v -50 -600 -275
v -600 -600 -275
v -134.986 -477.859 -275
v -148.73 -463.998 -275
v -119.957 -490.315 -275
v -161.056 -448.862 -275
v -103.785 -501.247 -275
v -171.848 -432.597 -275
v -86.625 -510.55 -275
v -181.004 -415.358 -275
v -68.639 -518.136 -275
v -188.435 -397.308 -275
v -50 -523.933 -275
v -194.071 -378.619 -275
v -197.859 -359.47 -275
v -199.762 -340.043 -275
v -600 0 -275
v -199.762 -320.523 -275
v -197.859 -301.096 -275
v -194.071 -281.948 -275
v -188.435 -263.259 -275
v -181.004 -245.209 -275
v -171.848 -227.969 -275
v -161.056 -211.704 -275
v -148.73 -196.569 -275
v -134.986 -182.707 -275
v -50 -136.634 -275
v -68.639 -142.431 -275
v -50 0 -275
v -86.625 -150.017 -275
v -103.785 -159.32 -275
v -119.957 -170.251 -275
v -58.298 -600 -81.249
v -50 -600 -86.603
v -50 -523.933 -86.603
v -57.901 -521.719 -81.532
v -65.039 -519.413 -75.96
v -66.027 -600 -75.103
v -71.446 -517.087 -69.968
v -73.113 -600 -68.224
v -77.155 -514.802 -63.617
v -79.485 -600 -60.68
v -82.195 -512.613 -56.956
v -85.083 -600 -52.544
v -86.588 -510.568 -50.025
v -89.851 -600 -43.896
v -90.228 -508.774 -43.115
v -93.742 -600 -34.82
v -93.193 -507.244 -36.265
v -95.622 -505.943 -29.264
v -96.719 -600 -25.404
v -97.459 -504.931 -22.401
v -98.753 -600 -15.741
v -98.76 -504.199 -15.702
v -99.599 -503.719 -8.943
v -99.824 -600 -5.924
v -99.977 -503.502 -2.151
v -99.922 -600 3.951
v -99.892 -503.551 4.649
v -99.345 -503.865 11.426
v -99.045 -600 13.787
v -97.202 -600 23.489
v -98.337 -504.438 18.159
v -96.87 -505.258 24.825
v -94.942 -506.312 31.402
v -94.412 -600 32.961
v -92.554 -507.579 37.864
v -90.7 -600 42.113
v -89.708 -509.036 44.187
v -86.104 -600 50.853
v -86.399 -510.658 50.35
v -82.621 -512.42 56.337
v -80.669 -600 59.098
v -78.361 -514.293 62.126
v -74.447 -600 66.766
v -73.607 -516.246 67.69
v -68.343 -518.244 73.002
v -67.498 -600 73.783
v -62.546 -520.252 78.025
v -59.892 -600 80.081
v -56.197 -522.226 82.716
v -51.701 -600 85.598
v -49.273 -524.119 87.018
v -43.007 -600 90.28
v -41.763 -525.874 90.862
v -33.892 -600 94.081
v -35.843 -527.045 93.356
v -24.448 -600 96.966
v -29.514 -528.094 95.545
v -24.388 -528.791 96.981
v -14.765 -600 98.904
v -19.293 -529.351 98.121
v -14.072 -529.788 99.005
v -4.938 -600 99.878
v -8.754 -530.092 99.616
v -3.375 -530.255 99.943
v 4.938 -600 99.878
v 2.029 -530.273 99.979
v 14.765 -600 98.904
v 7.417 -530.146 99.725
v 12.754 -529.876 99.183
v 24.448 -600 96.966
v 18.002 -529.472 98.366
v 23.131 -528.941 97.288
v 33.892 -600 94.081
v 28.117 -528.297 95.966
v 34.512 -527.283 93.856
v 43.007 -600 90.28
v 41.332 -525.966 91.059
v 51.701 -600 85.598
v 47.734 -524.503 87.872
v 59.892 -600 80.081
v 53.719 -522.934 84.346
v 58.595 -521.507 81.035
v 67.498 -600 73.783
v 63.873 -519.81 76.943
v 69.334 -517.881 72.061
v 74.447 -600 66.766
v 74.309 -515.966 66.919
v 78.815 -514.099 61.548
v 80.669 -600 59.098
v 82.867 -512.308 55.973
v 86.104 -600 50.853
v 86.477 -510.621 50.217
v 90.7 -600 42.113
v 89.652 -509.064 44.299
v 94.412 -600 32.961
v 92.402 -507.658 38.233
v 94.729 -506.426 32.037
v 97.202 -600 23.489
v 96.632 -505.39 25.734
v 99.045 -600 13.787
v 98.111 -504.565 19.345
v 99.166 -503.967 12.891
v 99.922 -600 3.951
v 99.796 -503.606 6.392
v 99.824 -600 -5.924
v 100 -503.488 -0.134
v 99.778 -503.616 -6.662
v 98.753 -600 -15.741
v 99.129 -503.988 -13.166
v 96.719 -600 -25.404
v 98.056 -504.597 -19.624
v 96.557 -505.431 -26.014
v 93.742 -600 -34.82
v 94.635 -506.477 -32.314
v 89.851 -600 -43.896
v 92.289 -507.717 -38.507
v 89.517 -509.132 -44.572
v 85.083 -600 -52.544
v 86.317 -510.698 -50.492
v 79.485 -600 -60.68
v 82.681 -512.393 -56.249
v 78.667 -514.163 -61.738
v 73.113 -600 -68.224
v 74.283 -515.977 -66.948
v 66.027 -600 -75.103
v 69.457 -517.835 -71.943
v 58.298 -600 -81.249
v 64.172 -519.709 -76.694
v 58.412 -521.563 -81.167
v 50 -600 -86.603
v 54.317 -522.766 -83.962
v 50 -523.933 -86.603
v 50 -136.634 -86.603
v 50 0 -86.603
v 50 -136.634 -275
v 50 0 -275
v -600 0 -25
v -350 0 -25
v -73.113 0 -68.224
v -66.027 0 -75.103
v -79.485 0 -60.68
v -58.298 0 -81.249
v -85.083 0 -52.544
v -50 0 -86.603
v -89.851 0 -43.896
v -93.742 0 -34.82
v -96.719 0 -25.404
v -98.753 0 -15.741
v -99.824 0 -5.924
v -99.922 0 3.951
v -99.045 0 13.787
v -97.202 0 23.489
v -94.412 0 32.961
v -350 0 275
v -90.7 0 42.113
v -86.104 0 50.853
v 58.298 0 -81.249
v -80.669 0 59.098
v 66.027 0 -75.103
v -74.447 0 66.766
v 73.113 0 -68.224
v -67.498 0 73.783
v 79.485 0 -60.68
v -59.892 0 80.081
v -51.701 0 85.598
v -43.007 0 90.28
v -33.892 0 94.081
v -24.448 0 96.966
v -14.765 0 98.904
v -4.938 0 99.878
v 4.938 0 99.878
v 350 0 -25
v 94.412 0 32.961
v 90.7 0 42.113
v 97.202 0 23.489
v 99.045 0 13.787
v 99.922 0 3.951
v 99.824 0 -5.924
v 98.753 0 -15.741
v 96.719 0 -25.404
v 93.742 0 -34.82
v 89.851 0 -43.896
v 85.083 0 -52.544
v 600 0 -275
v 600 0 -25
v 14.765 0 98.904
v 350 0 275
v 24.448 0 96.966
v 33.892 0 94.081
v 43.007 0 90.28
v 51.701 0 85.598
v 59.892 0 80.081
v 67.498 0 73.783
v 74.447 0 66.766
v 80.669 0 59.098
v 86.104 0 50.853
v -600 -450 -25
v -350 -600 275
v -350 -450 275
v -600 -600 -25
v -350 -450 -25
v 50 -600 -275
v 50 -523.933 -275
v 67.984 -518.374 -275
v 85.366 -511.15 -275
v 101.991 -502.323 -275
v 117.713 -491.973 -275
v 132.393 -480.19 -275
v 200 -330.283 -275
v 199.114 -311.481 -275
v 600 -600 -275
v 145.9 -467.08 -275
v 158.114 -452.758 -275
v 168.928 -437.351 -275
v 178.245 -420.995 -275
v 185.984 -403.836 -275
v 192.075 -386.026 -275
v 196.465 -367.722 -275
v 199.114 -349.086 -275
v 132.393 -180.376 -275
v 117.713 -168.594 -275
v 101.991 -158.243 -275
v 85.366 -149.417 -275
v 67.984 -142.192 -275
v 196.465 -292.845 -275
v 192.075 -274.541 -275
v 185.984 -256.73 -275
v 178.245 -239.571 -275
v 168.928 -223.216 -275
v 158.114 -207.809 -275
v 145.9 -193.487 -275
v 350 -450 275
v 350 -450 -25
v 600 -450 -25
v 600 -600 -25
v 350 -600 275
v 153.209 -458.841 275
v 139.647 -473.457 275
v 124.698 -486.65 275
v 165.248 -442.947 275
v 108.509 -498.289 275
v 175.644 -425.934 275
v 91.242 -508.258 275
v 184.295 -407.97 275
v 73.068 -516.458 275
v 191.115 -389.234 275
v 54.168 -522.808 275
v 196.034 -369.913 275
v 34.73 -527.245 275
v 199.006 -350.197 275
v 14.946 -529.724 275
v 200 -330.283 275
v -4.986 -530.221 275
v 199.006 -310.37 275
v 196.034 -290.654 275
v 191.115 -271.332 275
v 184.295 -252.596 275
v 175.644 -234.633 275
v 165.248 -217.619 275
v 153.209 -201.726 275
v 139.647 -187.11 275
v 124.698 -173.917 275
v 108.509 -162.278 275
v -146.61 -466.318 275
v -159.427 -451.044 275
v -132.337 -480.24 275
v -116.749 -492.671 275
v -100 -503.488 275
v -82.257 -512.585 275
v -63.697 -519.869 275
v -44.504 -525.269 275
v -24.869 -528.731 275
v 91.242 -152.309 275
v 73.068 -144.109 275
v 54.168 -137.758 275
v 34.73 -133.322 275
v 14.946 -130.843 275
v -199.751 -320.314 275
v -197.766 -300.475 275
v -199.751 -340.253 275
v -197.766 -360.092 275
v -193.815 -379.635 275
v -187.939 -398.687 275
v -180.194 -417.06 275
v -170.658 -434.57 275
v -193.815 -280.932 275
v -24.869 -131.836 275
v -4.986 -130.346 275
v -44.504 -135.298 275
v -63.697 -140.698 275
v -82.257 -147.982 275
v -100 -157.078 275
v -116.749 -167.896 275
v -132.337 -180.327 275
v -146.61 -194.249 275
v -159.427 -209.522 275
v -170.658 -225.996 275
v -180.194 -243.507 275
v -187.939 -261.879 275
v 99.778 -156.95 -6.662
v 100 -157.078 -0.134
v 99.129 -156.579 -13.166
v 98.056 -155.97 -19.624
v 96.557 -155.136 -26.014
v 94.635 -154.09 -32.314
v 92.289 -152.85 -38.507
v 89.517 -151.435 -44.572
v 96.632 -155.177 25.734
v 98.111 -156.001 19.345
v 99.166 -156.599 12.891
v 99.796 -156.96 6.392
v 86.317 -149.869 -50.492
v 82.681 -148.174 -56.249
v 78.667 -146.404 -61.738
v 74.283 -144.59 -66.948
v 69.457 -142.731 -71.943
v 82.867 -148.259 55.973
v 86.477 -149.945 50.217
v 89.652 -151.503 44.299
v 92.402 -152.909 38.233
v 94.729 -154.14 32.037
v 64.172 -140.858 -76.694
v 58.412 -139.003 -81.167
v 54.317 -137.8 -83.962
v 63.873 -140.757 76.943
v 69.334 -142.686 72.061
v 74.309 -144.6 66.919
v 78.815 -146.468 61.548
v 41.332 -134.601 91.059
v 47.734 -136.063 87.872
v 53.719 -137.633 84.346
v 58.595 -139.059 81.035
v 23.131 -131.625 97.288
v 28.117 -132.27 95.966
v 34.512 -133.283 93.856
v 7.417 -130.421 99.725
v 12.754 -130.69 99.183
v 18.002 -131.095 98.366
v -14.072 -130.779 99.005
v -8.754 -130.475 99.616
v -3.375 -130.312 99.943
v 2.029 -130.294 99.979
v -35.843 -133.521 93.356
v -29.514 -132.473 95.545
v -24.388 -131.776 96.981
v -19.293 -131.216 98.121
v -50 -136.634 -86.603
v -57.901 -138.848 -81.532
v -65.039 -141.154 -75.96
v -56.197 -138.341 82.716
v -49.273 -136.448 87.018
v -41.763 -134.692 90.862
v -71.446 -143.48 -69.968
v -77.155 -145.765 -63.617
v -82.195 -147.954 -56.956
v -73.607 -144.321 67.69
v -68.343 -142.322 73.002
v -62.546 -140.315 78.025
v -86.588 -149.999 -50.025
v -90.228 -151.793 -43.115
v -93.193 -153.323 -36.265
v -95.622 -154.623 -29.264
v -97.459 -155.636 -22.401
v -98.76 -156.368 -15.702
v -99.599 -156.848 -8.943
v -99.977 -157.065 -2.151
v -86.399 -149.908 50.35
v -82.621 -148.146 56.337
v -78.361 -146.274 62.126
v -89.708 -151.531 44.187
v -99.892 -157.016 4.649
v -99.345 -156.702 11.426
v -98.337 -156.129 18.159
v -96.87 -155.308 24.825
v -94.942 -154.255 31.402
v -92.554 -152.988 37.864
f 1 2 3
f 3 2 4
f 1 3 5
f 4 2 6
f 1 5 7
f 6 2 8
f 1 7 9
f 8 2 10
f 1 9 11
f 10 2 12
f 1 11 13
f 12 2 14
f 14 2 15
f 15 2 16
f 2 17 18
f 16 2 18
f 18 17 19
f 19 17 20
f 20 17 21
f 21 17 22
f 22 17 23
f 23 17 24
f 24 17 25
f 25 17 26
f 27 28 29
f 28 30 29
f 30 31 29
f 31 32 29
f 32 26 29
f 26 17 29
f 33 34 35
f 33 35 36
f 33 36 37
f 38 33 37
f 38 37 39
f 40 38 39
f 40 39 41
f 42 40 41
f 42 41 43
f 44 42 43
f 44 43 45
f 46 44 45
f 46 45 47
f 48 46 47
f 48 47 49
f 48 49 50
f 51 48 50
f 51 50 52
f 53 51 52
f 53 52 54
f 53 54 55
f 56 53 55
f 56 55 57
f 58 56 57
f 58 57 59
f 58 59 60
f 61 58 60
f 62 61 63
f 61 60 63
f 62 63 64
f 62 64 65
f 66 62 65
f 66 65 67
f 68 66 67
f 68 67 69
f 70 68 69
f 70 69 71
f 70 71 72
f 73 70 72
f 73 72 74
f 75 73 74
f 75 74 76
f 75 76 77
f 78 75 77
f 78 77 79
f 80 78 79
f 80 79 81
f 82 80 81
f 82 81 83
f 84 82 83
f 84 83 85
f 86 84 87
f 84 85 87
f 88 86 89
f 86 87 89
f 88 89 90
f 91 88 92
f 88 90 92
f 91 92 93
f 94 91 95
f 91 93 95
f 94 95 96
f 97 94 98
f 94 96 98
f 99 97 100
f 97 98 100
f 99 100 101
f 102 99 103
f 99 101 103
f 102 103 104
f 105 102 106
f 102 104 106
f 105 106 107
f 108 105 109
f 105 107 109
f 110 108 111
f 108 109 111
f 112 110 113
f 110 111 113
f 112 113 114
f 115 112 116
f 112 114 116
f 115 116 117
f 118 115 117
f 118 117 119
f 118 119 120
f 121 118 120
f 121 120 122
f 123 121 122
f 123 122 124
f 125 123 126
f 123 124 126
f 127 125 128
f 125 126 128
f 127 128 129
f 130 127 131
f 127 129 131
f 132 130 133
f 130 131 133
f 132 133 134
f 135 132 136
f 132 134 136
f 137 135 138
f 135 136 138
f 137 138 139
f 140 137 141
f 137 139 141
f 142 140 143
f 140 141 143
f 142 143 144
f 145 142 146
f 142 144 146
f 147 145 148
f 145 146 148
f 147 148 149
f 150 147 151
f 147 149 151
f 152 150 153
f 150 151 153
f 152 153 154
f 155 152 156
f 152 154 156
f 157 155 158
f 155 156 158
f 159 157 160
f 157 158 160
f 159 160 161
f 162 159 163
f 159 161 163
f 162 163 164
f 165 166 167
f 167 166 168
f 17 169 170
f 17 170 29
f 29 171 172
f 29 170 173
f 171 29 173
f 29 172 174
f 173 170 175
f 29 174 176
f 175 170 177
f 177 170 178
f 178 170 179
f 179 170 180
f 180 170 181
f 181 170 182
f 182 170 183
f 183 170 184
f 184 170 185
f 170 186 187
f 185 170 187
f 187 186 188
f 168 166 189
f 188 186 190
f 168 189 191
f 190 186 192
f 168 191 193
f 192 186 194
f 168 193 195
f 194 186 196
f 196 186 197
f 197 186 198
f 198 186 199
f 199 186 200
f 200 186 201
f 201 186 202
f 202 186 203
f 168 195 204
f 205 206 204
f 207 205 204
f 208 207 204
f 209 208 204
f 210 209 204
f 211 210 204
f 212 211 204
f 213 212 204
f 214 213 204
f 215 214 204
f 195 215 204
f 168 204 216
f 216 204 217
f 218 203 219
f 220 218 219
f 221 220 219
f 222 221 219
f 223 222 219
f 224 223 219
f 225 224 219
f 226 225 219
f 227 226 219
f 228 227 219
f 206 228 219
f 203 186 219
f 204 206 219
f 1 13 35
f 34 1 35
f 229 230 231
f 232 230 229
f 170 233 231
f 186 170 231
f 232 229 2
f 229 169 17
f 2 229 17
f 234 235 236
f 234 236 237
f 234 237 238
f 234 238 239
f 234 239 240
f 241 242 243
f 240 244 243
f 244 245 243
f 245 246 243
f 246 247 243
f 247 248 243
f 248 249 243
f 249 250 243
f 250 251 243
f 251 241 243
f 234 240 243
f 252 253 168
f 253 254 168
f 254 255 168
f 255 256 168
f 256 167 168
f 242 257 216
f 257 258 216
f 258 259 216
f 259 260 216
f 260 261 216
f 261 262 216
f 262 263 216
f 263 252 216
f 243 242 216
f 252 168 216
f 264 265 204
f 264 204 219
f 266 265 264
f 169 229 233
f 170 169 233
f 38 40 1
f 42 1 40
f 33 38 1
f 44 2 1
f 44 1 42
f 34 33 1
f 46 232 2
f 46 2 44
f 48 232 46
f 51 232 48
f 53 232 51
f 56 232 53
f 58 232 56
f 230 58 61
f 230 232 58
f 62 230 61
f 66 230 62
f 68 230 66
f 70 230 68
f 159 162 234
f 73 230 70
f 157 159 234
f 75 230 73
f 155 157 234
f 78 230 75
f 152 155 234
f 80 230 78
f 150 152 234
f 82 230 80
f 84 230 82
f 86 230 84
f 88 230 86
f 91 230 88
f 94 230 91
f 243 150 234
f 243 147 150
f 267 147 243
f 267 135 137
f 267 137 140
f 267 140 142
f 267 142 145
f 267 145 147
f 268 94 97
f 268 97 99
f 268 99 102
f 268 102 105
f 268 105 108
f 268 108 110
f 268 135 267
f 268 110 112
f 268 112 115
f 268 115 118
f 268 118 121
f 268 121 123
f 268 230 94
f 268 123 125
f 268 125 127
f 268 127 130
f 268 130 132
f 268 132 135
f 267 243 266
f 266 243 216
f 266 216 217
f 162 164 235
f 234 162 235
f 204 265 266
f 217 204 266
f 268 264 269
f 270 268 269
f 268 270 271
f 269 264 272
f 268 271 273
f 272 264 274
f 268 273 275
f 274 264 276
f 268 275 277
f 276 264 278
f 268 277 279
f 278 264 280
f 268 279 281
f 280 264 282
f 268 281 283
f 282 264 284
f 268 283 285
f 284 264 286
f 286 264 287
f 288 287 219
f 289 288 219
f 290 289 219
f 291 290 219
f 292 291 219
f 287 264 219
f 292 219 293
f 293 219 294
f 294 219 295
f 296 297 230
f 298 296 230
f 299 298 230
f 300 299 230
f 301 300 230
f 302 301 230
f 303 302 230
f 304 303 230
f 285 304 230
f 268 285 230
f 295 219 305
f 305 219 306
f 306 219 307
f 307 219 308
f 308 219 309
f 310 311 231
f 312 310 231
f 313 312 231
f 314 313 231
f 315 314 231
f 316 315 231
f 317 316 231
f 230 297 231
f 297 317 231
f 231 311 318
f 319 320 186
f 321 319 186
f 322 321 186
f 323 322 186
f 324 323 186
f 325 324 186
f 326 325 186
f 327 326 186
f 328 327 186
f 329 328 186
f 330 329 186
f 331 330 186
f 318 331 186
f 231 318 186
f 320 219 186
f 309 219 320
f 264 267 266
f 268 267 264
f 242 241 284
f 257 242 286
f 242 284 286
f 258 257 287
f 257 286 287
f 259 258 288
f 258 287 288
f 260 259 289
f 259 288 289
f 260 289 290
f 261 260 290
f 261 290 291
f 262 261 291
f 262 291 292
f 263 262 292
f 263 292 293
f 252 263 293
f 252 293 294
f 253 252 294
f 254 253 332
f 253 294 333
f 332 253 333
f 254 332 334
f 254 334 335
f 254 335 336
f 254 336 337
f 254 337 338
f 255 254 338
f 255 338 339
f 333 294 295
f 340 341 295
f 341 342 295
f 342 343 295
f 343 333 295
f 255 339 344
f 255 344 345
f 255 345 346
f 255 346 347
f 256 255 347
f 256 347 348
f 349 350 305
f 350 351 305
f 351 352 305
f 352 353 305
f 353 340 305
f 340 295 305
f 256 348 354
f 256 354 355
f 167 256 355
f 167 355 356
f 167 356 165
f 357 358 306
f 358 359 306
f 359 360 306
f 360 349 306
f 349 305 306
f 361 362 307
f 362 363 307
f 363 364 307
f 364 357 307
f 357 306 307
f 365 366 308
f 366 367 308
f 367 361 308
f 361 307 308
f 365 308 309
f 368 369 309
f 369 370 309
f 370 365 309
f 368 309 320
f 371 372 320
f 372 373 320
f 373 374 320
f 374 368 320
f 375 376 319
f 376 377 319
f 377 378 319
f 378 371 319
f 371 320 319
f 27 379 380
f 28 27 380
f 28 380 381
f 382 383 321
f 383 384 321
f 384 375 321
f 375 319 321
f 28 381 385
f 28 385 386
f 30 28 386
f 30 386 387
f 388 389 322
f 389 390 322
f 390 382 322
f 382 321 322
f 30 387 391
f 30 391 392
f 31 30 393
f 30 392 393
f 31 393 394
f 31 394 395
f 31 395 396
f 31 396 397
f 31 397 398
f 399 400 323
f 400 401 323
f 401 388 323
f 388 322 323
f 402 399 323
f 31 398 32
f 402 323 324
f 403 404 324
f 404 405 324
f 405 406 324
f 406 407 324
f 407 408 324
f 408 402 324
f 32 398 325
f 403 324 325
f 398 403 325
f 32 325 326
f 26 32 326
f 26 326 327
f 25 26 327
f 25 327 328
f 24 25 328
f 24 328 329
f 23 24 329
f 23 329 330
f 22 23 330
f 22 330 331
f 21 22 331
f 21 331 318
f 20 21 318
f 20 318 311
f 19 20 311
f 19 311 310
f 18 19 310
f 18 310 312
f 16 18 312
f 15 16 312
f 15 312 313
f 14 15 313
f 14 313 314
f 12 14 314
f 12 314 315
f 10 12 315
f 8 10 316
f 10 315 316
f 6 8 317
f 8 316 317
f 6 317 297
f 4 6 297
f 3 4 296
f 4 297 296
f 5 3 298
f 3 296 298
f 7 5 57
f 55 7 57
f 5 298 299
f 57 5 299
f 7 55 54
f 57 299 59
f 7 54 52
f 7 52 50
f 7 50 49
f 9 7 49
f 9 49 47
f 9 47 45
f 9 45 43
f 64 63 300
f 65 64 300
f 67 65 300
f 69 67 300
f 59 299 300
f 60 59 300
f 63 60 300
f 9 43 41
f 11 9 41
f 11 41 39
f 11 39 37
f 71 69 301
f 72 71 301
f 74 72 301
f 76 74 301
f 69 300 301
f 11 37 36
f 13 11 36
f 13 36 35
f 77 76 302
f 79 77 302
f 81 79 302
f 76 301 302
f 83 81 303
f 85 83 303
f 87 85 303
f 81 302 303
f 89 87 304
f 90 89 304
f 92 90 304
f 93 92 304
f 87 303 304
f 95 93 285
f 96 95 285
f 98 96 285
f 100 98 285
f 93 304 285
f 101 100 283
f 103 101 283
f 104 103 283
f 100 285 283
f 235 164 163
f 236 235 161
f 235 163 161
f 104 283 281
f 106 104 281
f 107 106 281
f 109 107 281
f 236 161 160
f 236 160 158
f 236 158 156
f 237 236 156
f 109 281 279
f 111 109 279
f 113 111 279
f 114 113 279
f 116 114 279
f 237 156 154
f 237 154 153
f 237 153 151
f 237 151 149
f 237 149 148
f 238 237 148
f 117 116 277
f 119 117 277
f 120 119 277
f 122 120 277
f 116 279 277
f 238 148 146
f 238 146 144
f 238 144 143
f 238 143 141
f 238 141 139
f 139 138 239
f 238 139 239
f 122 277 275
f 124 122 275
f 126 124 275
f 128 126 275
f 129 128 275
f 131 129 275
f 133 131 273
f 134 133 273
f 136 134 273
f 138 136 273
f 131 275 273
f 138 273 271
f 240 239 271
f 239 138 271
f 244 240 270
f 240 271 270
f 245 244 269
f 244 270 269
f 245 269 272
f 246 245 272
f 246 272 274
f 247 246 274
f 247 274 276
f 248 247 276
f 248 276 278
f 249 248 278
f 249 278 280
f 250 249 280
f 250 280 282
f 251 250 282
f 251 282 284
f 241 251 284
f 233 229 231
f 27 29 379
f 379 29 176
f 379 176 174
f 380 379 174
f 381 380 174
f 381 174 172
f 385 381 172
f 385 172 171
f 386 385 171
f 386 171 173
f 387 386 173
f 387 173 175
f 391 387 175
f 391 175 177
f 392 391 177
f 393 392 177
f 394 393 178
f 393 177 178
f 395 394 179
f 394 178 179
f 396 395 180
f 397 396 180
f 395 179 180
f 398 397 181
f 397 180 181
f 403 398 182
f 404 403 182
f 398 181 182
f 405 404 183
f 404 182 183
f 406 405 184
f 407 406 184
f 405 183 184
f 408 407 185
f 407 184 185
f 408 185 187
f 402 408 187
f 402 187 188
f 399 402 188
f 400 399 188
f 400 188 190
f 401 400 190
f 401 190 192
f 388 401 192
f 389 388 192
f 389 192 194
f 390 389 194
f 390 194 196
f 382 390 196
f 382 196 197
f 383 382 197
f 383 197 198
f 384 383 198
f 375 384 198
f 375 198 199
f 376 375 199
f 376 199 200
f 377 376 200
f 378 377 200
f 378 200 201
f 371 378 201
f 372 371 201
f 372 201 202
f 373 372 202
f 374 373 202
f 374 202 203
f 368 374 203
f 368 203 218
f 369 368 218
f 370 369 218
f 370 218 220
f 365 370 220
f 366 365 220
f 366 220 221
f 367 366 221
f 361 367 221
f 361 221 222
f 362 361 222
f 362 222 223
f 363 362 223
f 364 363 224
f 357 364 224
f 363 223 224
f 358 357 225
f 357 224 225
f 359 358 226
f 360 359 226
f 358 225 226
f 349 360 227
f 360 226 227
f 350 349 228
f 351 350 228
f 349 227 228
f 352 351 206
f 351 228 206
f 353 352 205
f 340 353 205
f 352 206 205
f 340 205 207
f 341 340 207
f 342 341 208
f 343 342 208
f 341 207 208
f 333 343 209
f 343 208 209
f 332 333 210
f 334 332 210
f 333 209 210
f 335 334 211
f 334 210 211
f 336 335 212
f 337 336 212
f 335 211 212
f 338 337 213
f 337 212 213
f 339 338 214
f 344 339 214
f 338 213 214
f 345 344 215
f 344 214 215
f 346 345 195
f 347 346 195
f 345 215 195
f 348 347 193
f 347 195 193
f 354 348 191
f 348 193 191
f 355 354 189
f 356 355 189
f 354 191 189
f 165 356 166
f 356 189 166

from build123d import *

# Parameters (mm, degrees)
F2_DEPTH  = 600
F3_W      = 250
F3_H      = 300
F4_DEPTH  = 600
F6_DEPTH  = 150
F8_DEPTH  = 150
F9_R      = 200
F10_DEPTH = 550.001


with BuildPart() as f2:
    # F1 (on face) → F2 (new body)
    with BuildSketch(Plane.XZ):
        with BuildLine():
            Line((600, -275), (600, 275))
            Line((600, 275), (-600, 275))
            Line((-600, 275), (-600, -275))
            Line((-600, -275), (-50, -275))
            Line((-50, -275), (-50, -86.6025403784))
            ThreePointArc((-50, -86.6025403784), (0, 100), (50, -86.6025403784))
            Line((50, -86.6025403784), (50, -100))
            Line((50, -100), (50, -101.5080809593))
            Line((50, -101.5080809593), (50, -275))
            Line((50, -275), (600, -275))
        make_face()
    extrude(amount=F2_DEPTH)

    # F3 (on face) → F4 (cut)
    with BuildSketch(Plane.XZ.offset(600)):
        with Locations((-475, 125)):
            Rectangle(F3_W, F3_H)
        with Locations((475, 125)):
            Rectangle(F3_W, F3_H)
    extrude(amount=-F4_DEPTH, mode=Mode.SUBTRACT)

    # F5 (on face) → F6 (join)
    with BuildSketch(Plane.XZ.offset(600)):
        Polygon((-350, 275), (-600, -25), (-350, -25), align=None)
    extrude(amount=-F6_DEPTH)

    # F7 (on face) → F8 (join)
    with BuildSketch(Plane.XZ.offset(600)):
        Polygon((350, -25), (600, -25), (350, 275), align=None)
    extrude(amount=-F8_DEPTH)

    # F9 (on face) → F10 (cut, through all)
    with BuildSketch(Plane.XY.offset(275)):
        with Locations((0, -330.283343792)):
            Circle(F9_R)
    extrude(amount=-F10_DEPTH, mode=Mode.SUBTRACT)


solid = f2.part
